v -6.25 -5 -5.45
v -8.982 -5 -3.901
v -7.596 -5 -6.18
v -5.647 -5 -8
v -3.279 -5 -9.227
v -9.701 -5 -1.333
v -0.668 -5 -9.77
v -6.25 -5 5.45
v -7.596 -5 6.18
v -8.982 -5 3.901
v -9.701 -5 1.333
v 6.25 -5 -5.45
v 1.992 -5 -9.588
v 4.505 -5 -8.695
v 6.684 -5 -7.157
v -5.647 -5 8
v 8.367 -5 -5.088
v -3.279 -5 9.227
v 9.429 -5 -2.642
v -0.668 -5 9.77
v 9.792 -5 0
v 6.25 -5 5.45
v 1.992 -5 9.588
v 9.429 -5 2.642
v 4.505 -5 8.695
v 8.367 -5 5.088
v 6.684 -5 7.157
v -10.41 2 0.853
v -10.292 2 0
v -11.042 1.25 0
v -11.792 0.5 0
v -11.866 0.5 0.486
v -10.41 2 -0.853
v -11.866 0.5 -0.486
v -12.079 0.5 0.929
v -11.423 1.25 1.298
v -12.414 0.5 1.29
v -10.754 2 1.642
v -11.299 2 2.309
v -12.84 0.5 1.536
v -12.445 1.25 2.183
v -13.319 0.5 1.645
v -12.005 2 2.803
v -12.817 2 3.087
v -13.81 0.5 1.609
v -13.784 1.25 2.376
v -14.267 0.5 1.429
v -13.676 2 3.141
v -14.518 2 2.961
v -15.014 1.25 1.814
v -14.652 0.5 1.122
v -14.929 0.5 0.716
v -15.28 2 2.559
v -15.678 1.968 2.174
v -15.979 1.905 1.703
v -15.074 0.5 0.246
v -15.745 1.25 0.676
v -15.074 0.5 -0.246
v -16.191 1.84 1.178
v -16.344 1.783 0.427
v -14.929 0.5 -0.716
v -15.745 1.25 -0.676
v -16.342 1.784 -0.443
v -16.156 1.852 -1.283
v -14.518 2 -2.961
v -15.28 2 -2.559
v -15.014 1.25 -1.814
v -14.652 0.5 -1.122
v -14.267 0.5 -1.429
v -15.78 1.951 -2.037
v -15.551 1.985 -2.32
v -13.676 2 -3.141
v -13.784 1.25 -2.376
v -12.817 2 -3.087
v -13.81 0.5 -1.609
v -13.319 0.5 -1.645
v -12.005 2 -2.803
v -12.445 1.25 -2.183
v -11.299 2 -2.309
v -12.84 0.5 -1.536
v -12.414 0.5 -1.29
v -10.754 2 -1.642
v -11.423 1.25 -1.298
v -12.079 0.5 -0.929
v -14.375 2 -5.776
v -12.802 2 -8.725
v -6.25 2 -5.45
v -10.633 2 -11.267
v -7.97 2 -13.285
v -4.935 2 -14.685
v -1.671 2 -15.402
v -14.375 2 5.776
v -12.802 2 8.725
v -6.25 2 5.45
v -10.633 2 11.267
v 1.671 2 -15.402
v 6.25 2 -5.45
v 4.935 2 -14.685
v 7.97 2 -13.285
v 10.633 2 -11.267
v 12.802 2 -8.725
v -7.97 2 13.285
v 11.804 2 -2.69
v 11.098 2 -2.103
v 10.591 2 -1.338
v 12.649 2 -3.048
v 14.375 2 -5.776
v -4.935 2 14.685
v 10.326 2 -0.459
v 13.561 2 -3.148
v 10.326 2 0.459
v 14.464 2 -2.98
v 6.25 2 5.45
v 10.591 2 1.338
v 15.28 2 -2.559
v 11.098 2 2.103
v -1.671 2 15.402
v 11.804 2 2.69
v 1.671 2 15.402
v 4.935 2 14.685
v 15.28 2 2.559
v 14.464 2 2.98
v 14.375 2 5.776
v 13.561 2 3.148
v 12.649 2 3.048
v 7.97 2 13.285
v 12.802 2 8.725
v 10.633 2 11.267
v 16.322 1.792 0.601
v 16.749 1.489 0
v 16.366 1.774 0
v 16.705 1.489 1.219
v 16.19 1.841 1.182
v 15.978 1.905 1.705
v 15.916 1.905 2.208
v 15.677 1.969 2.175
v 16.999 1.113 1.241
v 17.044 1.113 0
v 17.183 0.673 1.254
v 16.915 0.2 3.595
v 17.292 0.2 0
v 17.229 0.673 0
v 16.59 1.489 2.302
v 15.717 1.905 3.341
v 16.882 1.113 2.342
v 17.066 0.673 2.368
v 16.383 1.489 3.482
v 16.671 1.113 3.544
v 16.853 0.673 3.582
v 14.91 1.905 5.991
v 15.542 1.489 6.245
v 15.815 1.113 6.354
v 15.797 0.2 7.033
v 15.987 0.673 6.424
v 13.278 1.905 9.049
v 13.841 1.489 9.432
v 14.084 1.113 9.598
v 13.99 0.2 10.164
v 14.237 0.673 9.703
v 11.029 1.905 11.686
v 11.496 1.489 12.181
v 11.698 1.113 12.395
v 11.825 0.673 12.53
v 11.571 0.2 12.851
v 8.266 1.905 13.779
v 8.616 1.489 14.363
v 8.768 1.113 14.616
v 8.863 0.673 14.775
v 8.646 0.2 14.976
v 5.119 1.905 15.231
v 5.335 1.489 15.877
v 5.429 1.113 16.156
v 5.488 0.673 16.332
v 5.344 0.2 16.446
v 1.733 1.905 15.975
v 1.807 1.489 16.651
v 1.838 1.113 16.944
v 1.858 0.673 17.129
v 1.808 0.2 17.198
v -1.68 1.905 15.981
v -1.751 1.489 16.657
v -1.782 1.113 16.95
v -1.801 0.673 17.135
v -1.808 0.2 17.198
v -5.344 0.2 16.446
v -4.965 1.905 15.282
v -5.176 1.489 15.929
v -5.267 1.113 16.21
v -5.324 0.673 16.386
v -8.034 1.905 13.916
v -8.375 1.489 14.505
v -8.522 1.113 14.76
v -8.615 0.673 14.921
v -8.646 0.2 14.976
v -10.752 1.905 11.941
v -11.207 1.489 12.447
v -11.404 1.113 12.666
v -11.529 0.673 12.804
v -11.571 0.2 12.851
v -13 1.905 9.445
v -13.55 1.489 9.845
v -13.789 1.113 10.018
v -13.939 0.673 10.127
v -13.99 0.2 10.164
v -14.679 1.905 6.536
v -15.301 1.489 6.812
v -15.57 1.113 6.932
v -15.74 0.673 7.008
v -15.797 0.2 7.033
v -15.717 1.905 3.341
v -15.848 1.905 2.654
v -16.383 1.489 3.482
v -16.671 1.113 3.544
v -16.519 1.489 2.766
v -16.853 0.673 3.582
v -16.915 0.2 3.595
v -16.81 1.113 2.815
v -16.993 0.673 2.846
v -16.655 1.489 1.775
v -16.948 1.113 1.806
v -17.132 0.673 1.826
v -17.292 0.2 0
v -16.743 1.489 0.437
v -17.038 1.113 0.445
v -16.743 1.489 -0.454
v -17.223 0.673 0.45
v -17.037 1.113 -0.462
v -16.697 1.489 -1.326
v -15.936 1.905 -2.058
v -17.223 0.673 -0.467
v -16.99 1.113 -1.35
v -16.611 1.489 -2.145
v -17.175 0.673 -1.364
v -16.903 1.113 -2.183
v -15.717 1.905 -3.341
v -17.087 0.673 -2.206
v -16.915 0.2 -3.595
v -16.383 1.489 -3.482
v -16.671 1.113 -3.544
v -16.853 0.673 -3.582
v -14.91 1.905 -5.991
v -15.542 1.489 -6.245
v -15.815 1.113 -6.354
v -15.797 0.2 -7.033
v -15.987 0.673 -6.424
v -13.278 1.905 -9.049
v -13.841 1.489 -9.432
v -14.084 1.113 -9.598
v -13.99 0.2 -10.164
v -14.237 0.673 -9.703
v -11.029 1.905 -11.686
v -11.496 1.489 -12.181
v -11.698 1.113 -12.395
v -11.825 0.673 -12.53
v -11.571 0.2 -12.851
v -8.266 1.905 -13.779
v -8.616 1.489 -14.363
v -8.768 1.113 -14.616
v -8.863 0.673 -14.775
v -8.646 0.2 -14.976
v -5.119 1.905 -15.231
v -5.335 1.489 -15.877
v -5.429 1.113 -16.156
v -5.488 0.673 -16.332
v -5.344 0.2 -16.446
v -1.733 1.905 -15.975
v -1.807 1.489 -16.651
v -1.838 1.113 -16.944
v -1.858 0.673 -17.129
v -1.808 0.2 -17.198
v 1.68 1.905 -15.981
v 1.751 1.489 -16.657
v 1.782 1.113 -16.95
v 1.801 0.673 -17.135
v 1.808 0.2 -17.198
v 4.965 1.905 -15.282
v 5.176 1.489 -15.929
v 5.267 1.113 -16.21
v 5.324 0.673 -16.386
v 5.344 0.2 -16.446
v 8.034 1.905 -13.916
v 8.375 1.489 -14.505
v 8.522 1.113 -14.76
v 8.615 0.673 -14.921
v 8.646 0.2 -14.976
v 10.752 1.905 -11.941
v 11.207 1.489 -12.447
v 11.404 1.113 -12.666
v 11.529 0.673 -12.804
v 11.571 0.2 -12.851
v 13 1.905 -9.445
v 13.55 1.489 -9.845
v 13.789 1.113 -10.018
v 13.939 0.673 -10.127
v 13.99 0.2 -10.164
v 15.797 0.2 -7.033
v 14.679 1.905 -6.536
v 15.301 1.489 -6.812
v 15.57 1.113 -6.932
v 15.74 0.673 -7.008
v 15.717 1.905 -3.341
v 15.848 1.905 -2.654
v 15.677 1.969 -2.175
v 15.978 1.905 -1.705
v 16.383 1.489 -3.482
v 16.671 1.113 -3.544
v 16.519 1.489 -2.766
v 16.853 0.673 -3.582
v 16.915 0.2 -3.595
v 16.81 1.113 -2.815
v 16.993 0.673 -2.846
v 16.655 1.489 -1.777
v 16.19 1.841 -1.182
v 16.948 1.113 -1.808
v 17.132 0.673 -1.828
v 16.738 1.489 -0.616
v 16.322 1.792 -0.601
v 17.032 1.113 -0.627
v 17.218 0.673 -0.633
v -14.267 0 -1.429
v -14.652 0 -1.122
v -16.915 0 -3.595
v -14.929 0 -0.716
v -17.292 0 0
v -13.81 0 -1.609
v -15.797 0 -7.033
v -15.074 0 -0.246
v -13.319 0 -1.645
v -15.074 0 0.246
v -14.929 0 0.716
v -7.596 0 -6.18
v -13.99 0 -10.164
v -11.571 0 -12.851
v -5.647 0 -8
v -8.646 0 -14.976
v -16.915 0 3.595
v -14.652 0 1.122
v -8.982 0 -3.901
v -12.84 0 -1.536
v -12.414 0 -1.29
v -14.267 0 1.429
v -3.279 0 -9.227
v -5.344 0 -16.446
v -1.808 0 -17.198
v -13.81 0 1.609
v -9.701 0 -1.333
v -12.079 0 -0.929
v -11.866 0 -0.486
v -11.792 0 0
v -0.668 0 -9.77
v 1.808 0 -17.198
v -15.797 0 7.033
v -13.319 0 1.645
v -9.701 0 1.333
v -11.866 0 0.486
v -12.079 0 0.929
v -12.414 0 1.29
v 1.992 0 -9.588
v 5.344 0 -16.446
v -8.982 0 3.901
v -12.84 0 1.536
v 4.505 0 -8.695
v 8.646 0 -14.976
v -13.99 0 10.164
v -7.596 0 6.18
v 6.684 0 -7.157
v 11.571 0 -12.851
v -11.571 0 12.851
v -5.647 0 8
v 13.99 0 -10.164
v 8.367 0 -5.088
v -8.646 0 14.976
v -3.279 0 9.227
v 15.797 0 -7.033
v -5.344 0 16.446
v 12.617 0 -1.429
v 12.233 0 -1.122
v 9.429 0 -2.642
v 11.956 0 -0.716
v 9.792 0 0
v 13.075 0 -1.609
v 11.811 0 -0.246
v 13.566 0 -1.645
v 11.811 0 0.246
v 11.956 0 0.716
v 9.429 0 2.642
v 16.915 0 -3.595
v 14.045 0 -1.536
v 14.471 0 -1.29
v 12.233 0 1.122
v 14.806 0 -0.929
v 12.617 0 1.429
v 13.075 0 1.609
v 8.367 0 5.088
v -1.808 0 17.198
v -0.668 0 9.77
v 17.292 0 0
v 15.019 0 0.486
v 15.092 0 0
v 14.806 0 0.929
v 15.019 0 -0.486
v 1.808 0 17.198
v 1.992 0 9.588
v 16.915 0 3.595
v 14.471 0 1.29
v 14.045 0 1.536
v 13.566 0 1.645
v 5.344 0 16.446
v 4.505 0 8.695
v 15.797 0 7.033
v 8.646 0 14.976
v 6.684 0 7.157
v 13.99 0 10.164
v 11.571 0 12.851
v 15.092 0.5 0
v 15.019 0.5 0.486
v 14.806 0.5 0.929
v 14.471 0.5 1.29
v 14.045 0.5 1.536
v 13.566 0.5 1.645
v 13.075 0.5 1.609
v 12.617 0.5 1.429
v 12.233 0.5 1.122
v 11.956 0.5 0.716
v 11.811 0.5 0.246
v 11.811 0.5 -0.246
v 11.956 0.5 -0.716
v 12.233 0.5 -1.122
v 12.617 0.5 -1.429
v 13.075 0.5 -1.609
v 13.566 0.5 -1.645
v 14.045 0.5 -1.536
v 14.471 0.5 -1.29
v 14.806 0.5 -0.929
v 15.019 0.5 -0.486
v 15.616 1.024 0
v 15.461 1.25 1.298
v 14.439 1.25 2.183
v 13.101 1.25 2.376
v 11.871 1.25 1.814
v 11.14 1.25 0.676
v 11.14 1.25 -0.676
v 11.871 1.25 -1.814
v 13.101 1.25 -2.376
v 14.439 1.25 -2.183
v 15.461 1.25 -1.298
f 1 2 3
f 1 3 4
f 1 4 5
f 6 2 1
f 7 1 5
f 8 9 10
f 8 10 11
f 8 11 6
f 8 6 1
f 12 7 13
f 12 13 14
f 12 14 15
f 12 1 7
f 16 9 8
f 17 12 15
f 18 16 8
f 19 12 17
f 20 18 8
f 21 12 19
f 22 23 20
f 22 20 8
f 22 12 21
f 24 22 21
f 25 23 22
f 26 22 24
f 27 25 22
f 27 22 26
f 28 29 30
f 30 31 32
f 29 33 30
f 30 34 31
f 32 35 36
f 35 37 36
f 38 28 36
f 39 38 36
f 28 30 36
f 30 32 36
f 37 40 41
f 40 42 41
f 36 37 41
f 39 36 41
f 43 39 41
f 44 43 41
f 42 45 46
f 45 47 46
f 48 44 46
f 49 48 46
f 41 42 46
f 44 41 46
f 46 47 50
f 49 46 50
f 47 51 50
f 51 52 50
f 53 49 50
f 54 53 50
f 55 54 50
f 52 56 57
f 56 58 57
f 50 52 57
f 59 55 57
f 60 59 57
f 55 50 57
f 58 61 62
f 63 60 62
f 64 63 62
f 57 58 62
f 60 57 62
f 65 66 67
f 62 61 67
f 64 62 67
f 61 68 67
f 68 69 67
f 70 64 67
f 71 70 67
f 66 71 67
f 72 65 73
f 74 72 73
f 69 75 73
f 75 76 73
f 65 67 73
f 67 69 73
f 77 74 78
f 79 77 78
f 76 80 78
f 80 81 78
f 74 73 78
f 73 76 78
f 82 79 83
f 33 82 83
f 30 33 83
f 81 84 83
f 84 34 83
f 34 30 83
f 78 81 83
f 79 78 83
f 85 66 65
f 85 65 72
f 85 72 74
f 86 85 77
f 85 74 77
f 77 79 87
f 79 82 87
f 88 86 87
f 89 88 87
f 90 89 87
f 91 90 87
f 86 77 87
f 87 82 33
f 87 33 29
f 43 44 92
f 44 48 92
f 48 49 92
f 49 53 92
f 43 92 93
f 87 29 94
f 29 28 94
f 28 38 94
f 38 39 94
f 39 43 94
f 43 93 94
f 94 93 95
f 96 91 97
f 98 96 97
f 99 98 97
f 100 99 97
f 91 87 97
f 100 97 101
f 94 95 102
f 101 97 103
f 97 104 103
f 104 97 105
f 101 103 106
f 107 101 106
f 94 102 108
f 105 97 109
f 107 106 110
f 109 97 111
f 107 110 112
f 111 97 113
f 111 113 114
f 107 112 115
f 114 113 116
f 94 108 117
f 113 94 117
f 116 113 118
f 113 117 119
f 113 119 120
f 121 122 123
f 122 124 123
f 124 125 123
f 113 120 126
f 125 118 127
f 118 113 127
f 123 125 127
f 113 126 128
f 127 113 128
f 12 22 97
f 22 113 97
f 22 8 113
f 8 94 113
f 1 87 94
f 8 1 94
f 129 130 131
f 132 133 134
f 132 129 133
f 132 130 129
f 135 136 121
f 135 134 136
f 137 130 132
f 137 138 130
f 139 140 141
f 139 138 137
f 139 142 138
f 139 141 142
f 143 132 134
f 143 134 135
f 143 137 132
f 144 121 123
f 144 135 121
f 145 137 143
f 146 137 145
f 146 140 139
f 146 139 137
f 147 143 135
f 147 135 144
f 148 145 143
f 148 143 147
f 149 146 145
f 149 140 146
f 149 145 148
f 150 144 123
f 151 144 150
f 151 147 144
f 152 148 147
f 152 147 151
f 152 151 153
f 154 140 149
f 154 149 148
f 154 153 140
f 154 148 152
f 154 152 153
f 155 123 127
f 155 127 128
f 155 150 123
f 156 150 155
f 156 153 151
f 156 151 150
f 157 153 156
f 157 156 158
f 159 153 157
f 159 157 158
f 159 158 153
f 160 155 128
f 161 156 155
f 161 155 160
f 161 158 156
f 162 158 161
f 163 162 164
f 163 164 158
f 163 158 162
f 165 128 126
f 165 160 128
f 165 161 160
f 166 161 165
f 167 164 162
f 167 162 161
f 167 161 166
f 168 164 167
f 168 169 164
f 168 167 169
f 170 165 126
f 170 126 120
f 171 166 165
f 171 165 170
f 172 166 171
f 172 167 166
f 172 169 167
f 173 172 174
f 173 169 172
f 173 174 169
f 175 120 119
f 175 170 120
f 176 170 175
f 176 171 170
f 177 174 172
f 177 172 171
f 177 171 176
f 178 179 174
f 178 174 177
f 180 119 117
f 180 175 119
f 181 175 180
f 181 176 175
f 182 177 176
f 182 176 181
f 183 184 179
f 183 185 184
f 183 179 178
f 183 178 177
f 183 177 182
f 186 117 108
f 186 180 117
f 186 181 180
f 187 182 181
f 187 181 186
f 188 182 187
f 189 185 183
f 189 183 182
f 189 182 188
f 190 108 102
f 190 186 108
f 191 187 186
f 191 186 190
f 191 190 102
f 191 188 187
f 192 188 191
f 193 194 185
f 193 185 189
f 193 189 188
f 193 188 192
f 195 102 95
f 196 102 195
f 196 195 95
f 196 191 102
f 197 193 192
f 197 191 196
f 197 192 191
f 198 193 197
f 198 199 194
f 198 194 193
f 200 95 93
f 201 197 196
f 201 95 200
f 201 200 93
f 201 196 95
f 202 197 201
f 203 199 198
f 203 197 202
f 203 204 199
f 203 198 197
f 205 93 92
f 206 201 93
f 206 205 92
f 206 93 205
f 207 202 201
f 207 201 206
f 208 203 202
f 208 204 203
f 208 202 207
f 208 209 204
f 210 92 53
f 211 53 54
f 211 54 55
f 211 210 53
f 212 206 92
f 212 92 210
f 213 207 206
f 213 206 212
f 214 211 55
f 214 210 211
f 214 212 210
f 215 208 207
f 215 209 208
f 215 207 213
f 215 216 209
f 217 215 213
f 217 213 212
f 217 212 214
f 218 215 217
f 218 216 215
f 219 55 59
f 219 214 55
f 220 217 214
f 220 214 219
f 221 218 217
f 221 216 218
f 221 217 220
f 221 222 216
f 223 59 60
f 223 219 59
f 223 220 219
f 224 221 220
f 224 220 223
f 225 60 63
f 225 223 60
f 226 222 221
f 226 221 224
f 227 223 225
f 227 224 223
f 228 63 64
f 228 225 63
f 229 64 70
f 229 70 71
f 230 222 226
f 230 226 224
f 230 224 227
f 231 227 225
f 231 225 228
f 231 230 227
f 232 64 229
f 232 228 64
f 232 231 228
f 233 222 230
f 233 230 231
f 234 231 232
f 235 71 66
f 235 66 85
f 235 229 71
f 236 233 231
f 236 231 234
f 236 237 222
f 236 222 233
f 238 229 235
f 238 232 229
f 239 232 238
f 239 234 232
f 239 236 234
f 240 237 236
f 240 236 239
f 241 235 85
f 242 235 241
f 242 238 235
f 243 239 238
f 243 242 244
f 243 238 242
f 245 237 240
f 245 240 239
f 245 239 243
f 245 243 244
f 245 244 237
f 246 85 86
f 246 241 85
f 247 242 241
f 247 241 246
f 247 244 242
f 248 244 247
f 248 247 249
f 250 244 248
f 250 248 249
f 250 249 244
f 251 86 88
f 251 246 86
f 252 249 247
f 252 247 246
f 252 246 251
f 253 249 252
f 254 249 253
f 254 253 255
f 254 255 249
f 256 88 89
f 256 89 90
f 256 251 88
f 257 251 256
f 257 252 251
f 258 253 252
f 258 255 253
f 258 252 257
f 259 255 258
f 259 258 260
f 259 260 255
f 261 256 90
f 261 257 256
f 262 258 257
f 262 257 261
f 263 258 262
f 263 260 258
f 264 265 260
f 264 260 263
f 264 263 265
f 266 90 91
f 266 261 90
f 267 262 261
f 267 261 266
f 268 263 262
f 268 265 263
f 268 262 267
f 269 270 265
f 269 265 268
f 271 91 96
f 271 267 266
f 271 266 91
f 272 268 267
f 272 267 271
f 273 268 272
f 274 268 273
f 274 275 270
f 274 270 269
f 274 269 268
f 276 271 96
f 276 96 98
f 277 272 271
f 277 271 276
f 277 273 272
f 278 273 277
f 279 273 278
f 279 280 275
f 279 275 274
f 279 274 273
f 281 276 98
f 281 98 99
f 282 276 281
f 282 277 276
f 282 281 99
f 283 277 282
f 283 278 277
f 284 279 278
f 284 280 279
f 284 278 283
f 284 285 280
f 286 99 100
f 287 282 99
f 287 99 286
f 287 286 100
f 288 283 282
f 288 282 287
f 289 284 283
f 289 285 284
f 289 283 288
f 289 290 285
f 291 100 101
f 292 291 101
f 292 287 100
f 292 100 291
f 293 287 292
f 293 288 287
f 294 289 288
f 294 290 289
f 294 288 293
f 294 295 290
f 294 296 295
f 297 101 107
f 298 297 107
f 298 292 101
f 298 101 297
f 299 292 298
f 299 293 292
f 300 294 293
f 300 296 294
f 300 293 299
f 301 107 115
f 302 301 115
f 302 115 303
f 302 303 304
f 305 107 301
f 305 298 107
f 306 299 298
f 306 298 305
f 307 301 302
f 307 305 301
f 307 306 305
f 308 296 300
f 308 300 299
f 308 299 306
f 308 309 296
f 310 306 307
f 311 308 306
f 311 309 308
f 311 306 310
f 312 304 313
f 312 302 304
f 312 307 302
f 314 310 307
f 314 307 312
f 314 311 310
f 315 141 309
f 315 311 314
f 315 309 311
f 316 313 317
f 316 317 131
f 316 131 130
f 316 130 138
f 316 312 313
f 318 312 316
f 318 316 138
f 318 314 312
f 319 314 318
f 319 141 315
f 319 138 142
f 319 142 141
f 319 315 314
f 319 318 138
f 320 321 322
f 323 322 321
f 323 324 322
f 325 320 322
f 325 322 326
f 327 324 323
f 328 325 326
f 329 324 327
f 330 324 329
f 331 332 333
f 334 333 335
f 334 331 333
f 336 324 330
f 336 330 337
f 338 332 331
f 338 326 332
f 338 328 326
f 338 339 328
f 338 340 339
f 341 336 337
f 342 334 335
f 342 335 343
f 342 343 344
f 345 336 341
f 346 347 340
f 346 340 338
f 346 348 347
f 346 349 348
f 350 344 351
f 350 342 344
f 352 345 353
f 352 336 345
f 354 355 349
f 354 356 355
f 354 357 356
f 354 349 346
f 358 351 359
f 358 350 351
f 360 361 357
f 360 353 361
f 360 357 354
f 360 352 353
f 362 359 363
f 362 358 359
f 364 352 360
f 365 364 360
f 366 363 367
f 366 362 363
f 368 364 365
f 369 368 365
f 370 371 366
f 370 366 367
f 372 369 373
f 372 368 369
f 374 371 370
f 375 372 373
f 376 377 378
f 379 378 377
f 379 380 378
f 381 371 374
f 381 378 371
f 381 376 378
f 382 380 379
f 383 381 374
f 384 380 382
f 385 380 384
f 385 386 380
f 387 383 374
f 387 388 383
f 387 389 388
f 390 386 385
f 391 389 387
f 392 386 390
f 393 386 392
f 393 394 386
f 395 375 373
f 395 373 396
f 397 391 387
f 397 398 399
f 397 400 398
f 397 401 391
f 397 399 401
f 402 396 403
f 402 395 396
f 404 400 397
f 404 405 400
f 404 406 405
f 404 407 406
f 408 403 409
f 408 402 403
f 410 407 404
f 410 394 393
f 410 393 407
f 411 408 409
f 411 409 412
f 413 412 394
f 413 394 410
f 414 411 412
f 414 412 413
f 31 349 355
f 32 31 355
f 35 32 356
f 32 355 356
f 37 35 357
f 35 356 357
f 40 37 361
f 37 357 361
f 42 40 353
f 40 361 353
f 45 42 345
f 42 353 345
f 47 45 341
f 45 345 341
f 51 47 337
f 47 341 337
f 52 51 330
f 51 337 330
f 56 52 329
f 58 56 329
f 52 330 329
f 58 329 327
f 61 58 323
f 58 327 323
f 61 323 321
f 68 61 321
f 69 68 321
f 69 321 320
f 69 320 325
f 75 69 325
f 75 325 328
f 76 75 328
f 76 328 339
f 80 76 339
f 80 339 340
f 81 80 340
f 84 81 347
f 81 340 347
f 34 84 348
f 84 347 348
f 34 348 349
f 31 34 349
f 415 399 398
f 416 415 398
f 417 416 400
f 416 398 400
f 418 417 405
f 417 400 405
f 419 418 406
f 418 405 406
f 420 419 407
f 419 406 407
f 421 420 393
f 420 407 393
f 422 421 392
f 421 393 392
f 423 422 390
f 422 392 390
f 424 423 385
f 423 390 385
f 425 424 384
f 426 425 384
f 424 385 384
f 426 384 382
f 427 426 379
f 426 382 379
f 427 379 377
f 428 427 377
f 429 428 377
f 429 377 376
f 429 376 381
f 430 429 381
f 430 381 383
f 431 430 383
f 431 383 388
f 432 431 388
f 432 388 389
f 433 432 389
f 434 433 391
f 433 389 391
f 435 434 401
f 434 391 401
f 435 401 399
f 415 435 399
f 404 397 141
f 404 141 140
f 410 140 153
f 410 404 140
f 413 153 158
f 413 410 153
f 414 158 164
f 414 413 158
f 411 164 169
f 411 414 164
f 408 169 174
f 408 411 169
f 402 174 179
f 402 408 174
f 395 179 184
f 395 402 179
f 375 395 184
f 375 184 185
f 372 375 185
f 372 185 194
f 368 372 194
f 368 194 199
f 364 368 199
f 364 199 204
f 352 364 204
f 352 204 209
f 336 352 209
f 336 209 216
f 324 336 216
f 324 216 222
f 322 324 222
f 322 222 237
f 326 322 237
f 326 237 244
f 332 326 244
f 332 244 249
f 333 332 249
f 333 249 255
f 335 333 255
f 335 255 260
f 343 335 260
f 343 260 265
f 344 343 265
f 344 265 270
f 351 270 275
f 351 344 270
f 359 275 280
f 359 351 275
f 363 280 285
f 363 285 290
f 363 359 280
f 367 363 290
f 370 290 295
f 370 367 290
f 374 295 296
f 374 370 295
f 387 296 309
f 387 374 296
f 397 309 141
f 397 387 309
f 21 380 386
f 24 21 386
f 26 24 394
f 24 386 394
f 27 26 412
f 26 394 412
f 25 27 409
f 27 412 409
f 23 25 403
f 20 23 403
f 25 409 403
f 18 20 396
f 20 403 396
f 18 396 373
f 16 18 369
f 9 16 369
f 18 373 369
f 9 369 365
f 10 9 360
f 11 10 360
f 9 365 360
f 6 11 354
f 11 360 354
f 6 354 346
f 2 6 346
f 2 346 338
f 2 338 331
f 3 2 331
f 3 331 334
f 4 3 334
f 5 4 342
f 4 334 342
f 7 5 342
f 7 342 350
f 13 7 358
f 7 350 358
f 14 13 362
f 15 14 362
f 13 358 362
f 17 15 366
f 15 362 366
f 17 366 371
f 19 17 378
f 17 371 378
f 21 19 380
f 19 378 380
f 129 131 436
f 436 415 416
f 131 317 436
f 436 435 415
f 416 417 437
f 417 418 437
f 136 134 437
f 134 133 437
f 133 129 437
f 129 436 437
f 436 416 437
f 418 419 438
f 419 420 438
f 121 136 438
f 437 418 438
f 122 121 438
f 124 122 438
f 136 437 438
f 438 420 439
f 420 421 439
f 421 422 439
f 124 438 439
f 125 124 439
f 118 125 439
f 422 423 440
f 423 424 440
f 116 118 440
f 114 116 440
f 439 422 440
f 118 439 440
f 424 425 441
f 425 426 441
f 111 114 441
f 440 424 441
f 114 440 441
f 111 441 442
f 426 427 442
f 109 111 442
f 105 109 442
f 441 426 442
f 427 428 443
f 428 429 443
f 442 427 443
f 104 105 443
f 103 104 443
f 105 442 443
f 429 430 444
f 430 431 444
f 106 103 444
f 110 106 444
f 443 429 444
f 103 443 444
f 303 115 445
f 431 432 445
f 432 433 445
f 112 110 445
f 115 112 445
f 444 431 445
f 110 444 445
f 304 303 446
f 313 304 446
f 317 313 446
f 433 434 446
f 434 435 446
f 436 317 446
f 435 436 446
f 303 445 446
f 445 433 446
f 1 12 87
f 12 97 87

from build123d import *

# Parameters (mm, degrees)
F0_R     = 17.2924664606
F0_R_2   = 1.65
F0_R_3   = 9.7924664606
F1_DEPTH = 2
F2_DEPTH = 5
F3_SIZE  = 1.5


# Not quite as in the source:
# - a fillet or chamfer that OpenCascade refuses, or shapes differently, is made with other operations: its cross-section is extruded or revolved along the edge and cut away or added


with BuildPart() as f1:
    # F0 (on Front) → F1 (new body)
    with BuildSketch(Plane.XZ):
        Circle(F0_R)
        with Locations((-13.4424664606, 0)):
            Circle(F0_R_2, mode=Mode.SUBTRACT)
        Circle(F0_R_3, mode=Mode.SUBTRACT)
        with Locations((13.4424664606, 0)):
            Circle(F0_R_2, mode=Mode.SUBTRACT)
        Circle(F0_R_3)
        with BuildLine():
            ThreePointArc((8.2924664606, 0), (7.7650793743, -2.9100759974), (6.25, -5.45))
            ThreePointArc((6.25, -5.45), (0, -8.2924664606), (-6.25, -5.45))
            ThreePointArc((-6.25, -5.45), (-8.2924664606, 0), (-6.25, 5.45))
            ThreePointArc((-6.25, 5.45), (0, 8.2924664606), (6.25, 5.45))
            ThreePointArc((6.25, 5.45), (7.7650793743, 2.9100759974), (8.2924664606, 0))
        make_face(mode=Mode.SUBTRACT)
        with BuildLine():
            ThreePointArc((-6.25, 5.45), (-8.2924664606, 0), (-6.25, -5.45))
            Line((-6.25, -5.45), (-6.25, 5.45))
        make_face()
        with BuildLine():
            Line((-6.25, 5.45), (6.25, 5.45))
            ThreePointArc((6.25, 5.45), (0, 8.2924664606), (-6.25, 5.45))
        make_face()
        with BuildLine():
            Line((6.25, 5.45), (6.25, -5.45))
            ThreePointArc((6.25, -5.45), (7.7650793743, -2.9100759974), (8.2924664606, 0))
            ThreePointArc((8.2924664606, 0), (7.7650793743, 2.9100759974), (6.25, 5.45))
        make_face()
        with BuildLine():
            ThreePointArc((-6.25, -5.45), (0, -8.2924664606), (6.25, -5.45))
            Line((6.25, -5.45), (-6.25, -5.45))
        make_face()
    extrude(amount=-F1_DEPTH)

    # F0 (on Front) → F2 (join)
    with BuildSketch(Plane.XZ):
        Circle(F0_R_3)
        with BuildLine():
            ThreePointArc((8.2924664606, 0), (7.7650793743, -2.9100759974), (6.25, -5.45))
            ThreePointArc((6.25, -5.45), (0, -8.2924664606), (-6.25, -5.45))
            ThreePointArc((-6.25, -5.45), (-8.2924664606, 0), (-6.25, 5.45))
            ThreePointArc((-6.25, 5.45), (0, 8.2924664606), (6.25, 5.45))
            ThreePointArc((6.25, 5.45), (7.7650793743, 2.9100759974), (8.2924664606, 0))
        make_face(mode=Mode.SUBTRACT)
        with BuildLine():
            ThreePointArc((-6.25, 5.45), (-8.2924664606, 0), (-6.25, -5.45))
            Line((-6.25, -5.45), (-6.25, 5.45))
        make_face()
        with BuildLine():
            Line((-6.25, 5.45), (6.25, 5.45))
            ThreePointArc((6.25, 5.45), (0, 8.2924664606), (-6.25, 5.45))
        make_face()
        with BuildLine():
            Line((6.25, 5.45), (6.25, -5.45))
            ThreePointArc((6.25, -5.45), (7.7650793743, -2.9100759974), (8.2924664606, 0))
            ThreePointArc((8.2924664606, 0), (7.7650793743, 2.9100759974), (6.25, 5.45))
        make_face()
        with BuildLine():
            ThreePointArc((-6.25, -5.45), (0, -8.2924664606), (6.25, -5.45))
            Line((6.25, -5.45), (-6.25, -5.45))
        make_face()
    extrude(amount=F2_DEPTH)

    # F3
    f3_edges = [f1.edges().sort_by_distance(p)[0] for p in [
        (11.792466, 2, 0),
        (-15.092466, 2, 0),
    ]]
    chamfer(f3_edges, length=F3_SIZE)

    # F4: fillet of radius 1.8 on 1 edges, made by hand

    # F4_s1 → F4_t2 (revolve, cut)
    with BuildSketch(Plane.XY):
        with BuildLine():
            ThreePointArc((15.4924664606, 2), (16.7652586667, 1.4727922061), (17.2924664606, 0.2))
            Line((17.2924664606, 0.2), (17.2924664606, 2))
            Line((17.2924664606, 2), (15.4924664606, 2))
        make_face()
    revolve(axis=Axis((0, 2, 0), (0, -1, 0)), mode=Mode.SUBTRACT)


solid = f1.part
